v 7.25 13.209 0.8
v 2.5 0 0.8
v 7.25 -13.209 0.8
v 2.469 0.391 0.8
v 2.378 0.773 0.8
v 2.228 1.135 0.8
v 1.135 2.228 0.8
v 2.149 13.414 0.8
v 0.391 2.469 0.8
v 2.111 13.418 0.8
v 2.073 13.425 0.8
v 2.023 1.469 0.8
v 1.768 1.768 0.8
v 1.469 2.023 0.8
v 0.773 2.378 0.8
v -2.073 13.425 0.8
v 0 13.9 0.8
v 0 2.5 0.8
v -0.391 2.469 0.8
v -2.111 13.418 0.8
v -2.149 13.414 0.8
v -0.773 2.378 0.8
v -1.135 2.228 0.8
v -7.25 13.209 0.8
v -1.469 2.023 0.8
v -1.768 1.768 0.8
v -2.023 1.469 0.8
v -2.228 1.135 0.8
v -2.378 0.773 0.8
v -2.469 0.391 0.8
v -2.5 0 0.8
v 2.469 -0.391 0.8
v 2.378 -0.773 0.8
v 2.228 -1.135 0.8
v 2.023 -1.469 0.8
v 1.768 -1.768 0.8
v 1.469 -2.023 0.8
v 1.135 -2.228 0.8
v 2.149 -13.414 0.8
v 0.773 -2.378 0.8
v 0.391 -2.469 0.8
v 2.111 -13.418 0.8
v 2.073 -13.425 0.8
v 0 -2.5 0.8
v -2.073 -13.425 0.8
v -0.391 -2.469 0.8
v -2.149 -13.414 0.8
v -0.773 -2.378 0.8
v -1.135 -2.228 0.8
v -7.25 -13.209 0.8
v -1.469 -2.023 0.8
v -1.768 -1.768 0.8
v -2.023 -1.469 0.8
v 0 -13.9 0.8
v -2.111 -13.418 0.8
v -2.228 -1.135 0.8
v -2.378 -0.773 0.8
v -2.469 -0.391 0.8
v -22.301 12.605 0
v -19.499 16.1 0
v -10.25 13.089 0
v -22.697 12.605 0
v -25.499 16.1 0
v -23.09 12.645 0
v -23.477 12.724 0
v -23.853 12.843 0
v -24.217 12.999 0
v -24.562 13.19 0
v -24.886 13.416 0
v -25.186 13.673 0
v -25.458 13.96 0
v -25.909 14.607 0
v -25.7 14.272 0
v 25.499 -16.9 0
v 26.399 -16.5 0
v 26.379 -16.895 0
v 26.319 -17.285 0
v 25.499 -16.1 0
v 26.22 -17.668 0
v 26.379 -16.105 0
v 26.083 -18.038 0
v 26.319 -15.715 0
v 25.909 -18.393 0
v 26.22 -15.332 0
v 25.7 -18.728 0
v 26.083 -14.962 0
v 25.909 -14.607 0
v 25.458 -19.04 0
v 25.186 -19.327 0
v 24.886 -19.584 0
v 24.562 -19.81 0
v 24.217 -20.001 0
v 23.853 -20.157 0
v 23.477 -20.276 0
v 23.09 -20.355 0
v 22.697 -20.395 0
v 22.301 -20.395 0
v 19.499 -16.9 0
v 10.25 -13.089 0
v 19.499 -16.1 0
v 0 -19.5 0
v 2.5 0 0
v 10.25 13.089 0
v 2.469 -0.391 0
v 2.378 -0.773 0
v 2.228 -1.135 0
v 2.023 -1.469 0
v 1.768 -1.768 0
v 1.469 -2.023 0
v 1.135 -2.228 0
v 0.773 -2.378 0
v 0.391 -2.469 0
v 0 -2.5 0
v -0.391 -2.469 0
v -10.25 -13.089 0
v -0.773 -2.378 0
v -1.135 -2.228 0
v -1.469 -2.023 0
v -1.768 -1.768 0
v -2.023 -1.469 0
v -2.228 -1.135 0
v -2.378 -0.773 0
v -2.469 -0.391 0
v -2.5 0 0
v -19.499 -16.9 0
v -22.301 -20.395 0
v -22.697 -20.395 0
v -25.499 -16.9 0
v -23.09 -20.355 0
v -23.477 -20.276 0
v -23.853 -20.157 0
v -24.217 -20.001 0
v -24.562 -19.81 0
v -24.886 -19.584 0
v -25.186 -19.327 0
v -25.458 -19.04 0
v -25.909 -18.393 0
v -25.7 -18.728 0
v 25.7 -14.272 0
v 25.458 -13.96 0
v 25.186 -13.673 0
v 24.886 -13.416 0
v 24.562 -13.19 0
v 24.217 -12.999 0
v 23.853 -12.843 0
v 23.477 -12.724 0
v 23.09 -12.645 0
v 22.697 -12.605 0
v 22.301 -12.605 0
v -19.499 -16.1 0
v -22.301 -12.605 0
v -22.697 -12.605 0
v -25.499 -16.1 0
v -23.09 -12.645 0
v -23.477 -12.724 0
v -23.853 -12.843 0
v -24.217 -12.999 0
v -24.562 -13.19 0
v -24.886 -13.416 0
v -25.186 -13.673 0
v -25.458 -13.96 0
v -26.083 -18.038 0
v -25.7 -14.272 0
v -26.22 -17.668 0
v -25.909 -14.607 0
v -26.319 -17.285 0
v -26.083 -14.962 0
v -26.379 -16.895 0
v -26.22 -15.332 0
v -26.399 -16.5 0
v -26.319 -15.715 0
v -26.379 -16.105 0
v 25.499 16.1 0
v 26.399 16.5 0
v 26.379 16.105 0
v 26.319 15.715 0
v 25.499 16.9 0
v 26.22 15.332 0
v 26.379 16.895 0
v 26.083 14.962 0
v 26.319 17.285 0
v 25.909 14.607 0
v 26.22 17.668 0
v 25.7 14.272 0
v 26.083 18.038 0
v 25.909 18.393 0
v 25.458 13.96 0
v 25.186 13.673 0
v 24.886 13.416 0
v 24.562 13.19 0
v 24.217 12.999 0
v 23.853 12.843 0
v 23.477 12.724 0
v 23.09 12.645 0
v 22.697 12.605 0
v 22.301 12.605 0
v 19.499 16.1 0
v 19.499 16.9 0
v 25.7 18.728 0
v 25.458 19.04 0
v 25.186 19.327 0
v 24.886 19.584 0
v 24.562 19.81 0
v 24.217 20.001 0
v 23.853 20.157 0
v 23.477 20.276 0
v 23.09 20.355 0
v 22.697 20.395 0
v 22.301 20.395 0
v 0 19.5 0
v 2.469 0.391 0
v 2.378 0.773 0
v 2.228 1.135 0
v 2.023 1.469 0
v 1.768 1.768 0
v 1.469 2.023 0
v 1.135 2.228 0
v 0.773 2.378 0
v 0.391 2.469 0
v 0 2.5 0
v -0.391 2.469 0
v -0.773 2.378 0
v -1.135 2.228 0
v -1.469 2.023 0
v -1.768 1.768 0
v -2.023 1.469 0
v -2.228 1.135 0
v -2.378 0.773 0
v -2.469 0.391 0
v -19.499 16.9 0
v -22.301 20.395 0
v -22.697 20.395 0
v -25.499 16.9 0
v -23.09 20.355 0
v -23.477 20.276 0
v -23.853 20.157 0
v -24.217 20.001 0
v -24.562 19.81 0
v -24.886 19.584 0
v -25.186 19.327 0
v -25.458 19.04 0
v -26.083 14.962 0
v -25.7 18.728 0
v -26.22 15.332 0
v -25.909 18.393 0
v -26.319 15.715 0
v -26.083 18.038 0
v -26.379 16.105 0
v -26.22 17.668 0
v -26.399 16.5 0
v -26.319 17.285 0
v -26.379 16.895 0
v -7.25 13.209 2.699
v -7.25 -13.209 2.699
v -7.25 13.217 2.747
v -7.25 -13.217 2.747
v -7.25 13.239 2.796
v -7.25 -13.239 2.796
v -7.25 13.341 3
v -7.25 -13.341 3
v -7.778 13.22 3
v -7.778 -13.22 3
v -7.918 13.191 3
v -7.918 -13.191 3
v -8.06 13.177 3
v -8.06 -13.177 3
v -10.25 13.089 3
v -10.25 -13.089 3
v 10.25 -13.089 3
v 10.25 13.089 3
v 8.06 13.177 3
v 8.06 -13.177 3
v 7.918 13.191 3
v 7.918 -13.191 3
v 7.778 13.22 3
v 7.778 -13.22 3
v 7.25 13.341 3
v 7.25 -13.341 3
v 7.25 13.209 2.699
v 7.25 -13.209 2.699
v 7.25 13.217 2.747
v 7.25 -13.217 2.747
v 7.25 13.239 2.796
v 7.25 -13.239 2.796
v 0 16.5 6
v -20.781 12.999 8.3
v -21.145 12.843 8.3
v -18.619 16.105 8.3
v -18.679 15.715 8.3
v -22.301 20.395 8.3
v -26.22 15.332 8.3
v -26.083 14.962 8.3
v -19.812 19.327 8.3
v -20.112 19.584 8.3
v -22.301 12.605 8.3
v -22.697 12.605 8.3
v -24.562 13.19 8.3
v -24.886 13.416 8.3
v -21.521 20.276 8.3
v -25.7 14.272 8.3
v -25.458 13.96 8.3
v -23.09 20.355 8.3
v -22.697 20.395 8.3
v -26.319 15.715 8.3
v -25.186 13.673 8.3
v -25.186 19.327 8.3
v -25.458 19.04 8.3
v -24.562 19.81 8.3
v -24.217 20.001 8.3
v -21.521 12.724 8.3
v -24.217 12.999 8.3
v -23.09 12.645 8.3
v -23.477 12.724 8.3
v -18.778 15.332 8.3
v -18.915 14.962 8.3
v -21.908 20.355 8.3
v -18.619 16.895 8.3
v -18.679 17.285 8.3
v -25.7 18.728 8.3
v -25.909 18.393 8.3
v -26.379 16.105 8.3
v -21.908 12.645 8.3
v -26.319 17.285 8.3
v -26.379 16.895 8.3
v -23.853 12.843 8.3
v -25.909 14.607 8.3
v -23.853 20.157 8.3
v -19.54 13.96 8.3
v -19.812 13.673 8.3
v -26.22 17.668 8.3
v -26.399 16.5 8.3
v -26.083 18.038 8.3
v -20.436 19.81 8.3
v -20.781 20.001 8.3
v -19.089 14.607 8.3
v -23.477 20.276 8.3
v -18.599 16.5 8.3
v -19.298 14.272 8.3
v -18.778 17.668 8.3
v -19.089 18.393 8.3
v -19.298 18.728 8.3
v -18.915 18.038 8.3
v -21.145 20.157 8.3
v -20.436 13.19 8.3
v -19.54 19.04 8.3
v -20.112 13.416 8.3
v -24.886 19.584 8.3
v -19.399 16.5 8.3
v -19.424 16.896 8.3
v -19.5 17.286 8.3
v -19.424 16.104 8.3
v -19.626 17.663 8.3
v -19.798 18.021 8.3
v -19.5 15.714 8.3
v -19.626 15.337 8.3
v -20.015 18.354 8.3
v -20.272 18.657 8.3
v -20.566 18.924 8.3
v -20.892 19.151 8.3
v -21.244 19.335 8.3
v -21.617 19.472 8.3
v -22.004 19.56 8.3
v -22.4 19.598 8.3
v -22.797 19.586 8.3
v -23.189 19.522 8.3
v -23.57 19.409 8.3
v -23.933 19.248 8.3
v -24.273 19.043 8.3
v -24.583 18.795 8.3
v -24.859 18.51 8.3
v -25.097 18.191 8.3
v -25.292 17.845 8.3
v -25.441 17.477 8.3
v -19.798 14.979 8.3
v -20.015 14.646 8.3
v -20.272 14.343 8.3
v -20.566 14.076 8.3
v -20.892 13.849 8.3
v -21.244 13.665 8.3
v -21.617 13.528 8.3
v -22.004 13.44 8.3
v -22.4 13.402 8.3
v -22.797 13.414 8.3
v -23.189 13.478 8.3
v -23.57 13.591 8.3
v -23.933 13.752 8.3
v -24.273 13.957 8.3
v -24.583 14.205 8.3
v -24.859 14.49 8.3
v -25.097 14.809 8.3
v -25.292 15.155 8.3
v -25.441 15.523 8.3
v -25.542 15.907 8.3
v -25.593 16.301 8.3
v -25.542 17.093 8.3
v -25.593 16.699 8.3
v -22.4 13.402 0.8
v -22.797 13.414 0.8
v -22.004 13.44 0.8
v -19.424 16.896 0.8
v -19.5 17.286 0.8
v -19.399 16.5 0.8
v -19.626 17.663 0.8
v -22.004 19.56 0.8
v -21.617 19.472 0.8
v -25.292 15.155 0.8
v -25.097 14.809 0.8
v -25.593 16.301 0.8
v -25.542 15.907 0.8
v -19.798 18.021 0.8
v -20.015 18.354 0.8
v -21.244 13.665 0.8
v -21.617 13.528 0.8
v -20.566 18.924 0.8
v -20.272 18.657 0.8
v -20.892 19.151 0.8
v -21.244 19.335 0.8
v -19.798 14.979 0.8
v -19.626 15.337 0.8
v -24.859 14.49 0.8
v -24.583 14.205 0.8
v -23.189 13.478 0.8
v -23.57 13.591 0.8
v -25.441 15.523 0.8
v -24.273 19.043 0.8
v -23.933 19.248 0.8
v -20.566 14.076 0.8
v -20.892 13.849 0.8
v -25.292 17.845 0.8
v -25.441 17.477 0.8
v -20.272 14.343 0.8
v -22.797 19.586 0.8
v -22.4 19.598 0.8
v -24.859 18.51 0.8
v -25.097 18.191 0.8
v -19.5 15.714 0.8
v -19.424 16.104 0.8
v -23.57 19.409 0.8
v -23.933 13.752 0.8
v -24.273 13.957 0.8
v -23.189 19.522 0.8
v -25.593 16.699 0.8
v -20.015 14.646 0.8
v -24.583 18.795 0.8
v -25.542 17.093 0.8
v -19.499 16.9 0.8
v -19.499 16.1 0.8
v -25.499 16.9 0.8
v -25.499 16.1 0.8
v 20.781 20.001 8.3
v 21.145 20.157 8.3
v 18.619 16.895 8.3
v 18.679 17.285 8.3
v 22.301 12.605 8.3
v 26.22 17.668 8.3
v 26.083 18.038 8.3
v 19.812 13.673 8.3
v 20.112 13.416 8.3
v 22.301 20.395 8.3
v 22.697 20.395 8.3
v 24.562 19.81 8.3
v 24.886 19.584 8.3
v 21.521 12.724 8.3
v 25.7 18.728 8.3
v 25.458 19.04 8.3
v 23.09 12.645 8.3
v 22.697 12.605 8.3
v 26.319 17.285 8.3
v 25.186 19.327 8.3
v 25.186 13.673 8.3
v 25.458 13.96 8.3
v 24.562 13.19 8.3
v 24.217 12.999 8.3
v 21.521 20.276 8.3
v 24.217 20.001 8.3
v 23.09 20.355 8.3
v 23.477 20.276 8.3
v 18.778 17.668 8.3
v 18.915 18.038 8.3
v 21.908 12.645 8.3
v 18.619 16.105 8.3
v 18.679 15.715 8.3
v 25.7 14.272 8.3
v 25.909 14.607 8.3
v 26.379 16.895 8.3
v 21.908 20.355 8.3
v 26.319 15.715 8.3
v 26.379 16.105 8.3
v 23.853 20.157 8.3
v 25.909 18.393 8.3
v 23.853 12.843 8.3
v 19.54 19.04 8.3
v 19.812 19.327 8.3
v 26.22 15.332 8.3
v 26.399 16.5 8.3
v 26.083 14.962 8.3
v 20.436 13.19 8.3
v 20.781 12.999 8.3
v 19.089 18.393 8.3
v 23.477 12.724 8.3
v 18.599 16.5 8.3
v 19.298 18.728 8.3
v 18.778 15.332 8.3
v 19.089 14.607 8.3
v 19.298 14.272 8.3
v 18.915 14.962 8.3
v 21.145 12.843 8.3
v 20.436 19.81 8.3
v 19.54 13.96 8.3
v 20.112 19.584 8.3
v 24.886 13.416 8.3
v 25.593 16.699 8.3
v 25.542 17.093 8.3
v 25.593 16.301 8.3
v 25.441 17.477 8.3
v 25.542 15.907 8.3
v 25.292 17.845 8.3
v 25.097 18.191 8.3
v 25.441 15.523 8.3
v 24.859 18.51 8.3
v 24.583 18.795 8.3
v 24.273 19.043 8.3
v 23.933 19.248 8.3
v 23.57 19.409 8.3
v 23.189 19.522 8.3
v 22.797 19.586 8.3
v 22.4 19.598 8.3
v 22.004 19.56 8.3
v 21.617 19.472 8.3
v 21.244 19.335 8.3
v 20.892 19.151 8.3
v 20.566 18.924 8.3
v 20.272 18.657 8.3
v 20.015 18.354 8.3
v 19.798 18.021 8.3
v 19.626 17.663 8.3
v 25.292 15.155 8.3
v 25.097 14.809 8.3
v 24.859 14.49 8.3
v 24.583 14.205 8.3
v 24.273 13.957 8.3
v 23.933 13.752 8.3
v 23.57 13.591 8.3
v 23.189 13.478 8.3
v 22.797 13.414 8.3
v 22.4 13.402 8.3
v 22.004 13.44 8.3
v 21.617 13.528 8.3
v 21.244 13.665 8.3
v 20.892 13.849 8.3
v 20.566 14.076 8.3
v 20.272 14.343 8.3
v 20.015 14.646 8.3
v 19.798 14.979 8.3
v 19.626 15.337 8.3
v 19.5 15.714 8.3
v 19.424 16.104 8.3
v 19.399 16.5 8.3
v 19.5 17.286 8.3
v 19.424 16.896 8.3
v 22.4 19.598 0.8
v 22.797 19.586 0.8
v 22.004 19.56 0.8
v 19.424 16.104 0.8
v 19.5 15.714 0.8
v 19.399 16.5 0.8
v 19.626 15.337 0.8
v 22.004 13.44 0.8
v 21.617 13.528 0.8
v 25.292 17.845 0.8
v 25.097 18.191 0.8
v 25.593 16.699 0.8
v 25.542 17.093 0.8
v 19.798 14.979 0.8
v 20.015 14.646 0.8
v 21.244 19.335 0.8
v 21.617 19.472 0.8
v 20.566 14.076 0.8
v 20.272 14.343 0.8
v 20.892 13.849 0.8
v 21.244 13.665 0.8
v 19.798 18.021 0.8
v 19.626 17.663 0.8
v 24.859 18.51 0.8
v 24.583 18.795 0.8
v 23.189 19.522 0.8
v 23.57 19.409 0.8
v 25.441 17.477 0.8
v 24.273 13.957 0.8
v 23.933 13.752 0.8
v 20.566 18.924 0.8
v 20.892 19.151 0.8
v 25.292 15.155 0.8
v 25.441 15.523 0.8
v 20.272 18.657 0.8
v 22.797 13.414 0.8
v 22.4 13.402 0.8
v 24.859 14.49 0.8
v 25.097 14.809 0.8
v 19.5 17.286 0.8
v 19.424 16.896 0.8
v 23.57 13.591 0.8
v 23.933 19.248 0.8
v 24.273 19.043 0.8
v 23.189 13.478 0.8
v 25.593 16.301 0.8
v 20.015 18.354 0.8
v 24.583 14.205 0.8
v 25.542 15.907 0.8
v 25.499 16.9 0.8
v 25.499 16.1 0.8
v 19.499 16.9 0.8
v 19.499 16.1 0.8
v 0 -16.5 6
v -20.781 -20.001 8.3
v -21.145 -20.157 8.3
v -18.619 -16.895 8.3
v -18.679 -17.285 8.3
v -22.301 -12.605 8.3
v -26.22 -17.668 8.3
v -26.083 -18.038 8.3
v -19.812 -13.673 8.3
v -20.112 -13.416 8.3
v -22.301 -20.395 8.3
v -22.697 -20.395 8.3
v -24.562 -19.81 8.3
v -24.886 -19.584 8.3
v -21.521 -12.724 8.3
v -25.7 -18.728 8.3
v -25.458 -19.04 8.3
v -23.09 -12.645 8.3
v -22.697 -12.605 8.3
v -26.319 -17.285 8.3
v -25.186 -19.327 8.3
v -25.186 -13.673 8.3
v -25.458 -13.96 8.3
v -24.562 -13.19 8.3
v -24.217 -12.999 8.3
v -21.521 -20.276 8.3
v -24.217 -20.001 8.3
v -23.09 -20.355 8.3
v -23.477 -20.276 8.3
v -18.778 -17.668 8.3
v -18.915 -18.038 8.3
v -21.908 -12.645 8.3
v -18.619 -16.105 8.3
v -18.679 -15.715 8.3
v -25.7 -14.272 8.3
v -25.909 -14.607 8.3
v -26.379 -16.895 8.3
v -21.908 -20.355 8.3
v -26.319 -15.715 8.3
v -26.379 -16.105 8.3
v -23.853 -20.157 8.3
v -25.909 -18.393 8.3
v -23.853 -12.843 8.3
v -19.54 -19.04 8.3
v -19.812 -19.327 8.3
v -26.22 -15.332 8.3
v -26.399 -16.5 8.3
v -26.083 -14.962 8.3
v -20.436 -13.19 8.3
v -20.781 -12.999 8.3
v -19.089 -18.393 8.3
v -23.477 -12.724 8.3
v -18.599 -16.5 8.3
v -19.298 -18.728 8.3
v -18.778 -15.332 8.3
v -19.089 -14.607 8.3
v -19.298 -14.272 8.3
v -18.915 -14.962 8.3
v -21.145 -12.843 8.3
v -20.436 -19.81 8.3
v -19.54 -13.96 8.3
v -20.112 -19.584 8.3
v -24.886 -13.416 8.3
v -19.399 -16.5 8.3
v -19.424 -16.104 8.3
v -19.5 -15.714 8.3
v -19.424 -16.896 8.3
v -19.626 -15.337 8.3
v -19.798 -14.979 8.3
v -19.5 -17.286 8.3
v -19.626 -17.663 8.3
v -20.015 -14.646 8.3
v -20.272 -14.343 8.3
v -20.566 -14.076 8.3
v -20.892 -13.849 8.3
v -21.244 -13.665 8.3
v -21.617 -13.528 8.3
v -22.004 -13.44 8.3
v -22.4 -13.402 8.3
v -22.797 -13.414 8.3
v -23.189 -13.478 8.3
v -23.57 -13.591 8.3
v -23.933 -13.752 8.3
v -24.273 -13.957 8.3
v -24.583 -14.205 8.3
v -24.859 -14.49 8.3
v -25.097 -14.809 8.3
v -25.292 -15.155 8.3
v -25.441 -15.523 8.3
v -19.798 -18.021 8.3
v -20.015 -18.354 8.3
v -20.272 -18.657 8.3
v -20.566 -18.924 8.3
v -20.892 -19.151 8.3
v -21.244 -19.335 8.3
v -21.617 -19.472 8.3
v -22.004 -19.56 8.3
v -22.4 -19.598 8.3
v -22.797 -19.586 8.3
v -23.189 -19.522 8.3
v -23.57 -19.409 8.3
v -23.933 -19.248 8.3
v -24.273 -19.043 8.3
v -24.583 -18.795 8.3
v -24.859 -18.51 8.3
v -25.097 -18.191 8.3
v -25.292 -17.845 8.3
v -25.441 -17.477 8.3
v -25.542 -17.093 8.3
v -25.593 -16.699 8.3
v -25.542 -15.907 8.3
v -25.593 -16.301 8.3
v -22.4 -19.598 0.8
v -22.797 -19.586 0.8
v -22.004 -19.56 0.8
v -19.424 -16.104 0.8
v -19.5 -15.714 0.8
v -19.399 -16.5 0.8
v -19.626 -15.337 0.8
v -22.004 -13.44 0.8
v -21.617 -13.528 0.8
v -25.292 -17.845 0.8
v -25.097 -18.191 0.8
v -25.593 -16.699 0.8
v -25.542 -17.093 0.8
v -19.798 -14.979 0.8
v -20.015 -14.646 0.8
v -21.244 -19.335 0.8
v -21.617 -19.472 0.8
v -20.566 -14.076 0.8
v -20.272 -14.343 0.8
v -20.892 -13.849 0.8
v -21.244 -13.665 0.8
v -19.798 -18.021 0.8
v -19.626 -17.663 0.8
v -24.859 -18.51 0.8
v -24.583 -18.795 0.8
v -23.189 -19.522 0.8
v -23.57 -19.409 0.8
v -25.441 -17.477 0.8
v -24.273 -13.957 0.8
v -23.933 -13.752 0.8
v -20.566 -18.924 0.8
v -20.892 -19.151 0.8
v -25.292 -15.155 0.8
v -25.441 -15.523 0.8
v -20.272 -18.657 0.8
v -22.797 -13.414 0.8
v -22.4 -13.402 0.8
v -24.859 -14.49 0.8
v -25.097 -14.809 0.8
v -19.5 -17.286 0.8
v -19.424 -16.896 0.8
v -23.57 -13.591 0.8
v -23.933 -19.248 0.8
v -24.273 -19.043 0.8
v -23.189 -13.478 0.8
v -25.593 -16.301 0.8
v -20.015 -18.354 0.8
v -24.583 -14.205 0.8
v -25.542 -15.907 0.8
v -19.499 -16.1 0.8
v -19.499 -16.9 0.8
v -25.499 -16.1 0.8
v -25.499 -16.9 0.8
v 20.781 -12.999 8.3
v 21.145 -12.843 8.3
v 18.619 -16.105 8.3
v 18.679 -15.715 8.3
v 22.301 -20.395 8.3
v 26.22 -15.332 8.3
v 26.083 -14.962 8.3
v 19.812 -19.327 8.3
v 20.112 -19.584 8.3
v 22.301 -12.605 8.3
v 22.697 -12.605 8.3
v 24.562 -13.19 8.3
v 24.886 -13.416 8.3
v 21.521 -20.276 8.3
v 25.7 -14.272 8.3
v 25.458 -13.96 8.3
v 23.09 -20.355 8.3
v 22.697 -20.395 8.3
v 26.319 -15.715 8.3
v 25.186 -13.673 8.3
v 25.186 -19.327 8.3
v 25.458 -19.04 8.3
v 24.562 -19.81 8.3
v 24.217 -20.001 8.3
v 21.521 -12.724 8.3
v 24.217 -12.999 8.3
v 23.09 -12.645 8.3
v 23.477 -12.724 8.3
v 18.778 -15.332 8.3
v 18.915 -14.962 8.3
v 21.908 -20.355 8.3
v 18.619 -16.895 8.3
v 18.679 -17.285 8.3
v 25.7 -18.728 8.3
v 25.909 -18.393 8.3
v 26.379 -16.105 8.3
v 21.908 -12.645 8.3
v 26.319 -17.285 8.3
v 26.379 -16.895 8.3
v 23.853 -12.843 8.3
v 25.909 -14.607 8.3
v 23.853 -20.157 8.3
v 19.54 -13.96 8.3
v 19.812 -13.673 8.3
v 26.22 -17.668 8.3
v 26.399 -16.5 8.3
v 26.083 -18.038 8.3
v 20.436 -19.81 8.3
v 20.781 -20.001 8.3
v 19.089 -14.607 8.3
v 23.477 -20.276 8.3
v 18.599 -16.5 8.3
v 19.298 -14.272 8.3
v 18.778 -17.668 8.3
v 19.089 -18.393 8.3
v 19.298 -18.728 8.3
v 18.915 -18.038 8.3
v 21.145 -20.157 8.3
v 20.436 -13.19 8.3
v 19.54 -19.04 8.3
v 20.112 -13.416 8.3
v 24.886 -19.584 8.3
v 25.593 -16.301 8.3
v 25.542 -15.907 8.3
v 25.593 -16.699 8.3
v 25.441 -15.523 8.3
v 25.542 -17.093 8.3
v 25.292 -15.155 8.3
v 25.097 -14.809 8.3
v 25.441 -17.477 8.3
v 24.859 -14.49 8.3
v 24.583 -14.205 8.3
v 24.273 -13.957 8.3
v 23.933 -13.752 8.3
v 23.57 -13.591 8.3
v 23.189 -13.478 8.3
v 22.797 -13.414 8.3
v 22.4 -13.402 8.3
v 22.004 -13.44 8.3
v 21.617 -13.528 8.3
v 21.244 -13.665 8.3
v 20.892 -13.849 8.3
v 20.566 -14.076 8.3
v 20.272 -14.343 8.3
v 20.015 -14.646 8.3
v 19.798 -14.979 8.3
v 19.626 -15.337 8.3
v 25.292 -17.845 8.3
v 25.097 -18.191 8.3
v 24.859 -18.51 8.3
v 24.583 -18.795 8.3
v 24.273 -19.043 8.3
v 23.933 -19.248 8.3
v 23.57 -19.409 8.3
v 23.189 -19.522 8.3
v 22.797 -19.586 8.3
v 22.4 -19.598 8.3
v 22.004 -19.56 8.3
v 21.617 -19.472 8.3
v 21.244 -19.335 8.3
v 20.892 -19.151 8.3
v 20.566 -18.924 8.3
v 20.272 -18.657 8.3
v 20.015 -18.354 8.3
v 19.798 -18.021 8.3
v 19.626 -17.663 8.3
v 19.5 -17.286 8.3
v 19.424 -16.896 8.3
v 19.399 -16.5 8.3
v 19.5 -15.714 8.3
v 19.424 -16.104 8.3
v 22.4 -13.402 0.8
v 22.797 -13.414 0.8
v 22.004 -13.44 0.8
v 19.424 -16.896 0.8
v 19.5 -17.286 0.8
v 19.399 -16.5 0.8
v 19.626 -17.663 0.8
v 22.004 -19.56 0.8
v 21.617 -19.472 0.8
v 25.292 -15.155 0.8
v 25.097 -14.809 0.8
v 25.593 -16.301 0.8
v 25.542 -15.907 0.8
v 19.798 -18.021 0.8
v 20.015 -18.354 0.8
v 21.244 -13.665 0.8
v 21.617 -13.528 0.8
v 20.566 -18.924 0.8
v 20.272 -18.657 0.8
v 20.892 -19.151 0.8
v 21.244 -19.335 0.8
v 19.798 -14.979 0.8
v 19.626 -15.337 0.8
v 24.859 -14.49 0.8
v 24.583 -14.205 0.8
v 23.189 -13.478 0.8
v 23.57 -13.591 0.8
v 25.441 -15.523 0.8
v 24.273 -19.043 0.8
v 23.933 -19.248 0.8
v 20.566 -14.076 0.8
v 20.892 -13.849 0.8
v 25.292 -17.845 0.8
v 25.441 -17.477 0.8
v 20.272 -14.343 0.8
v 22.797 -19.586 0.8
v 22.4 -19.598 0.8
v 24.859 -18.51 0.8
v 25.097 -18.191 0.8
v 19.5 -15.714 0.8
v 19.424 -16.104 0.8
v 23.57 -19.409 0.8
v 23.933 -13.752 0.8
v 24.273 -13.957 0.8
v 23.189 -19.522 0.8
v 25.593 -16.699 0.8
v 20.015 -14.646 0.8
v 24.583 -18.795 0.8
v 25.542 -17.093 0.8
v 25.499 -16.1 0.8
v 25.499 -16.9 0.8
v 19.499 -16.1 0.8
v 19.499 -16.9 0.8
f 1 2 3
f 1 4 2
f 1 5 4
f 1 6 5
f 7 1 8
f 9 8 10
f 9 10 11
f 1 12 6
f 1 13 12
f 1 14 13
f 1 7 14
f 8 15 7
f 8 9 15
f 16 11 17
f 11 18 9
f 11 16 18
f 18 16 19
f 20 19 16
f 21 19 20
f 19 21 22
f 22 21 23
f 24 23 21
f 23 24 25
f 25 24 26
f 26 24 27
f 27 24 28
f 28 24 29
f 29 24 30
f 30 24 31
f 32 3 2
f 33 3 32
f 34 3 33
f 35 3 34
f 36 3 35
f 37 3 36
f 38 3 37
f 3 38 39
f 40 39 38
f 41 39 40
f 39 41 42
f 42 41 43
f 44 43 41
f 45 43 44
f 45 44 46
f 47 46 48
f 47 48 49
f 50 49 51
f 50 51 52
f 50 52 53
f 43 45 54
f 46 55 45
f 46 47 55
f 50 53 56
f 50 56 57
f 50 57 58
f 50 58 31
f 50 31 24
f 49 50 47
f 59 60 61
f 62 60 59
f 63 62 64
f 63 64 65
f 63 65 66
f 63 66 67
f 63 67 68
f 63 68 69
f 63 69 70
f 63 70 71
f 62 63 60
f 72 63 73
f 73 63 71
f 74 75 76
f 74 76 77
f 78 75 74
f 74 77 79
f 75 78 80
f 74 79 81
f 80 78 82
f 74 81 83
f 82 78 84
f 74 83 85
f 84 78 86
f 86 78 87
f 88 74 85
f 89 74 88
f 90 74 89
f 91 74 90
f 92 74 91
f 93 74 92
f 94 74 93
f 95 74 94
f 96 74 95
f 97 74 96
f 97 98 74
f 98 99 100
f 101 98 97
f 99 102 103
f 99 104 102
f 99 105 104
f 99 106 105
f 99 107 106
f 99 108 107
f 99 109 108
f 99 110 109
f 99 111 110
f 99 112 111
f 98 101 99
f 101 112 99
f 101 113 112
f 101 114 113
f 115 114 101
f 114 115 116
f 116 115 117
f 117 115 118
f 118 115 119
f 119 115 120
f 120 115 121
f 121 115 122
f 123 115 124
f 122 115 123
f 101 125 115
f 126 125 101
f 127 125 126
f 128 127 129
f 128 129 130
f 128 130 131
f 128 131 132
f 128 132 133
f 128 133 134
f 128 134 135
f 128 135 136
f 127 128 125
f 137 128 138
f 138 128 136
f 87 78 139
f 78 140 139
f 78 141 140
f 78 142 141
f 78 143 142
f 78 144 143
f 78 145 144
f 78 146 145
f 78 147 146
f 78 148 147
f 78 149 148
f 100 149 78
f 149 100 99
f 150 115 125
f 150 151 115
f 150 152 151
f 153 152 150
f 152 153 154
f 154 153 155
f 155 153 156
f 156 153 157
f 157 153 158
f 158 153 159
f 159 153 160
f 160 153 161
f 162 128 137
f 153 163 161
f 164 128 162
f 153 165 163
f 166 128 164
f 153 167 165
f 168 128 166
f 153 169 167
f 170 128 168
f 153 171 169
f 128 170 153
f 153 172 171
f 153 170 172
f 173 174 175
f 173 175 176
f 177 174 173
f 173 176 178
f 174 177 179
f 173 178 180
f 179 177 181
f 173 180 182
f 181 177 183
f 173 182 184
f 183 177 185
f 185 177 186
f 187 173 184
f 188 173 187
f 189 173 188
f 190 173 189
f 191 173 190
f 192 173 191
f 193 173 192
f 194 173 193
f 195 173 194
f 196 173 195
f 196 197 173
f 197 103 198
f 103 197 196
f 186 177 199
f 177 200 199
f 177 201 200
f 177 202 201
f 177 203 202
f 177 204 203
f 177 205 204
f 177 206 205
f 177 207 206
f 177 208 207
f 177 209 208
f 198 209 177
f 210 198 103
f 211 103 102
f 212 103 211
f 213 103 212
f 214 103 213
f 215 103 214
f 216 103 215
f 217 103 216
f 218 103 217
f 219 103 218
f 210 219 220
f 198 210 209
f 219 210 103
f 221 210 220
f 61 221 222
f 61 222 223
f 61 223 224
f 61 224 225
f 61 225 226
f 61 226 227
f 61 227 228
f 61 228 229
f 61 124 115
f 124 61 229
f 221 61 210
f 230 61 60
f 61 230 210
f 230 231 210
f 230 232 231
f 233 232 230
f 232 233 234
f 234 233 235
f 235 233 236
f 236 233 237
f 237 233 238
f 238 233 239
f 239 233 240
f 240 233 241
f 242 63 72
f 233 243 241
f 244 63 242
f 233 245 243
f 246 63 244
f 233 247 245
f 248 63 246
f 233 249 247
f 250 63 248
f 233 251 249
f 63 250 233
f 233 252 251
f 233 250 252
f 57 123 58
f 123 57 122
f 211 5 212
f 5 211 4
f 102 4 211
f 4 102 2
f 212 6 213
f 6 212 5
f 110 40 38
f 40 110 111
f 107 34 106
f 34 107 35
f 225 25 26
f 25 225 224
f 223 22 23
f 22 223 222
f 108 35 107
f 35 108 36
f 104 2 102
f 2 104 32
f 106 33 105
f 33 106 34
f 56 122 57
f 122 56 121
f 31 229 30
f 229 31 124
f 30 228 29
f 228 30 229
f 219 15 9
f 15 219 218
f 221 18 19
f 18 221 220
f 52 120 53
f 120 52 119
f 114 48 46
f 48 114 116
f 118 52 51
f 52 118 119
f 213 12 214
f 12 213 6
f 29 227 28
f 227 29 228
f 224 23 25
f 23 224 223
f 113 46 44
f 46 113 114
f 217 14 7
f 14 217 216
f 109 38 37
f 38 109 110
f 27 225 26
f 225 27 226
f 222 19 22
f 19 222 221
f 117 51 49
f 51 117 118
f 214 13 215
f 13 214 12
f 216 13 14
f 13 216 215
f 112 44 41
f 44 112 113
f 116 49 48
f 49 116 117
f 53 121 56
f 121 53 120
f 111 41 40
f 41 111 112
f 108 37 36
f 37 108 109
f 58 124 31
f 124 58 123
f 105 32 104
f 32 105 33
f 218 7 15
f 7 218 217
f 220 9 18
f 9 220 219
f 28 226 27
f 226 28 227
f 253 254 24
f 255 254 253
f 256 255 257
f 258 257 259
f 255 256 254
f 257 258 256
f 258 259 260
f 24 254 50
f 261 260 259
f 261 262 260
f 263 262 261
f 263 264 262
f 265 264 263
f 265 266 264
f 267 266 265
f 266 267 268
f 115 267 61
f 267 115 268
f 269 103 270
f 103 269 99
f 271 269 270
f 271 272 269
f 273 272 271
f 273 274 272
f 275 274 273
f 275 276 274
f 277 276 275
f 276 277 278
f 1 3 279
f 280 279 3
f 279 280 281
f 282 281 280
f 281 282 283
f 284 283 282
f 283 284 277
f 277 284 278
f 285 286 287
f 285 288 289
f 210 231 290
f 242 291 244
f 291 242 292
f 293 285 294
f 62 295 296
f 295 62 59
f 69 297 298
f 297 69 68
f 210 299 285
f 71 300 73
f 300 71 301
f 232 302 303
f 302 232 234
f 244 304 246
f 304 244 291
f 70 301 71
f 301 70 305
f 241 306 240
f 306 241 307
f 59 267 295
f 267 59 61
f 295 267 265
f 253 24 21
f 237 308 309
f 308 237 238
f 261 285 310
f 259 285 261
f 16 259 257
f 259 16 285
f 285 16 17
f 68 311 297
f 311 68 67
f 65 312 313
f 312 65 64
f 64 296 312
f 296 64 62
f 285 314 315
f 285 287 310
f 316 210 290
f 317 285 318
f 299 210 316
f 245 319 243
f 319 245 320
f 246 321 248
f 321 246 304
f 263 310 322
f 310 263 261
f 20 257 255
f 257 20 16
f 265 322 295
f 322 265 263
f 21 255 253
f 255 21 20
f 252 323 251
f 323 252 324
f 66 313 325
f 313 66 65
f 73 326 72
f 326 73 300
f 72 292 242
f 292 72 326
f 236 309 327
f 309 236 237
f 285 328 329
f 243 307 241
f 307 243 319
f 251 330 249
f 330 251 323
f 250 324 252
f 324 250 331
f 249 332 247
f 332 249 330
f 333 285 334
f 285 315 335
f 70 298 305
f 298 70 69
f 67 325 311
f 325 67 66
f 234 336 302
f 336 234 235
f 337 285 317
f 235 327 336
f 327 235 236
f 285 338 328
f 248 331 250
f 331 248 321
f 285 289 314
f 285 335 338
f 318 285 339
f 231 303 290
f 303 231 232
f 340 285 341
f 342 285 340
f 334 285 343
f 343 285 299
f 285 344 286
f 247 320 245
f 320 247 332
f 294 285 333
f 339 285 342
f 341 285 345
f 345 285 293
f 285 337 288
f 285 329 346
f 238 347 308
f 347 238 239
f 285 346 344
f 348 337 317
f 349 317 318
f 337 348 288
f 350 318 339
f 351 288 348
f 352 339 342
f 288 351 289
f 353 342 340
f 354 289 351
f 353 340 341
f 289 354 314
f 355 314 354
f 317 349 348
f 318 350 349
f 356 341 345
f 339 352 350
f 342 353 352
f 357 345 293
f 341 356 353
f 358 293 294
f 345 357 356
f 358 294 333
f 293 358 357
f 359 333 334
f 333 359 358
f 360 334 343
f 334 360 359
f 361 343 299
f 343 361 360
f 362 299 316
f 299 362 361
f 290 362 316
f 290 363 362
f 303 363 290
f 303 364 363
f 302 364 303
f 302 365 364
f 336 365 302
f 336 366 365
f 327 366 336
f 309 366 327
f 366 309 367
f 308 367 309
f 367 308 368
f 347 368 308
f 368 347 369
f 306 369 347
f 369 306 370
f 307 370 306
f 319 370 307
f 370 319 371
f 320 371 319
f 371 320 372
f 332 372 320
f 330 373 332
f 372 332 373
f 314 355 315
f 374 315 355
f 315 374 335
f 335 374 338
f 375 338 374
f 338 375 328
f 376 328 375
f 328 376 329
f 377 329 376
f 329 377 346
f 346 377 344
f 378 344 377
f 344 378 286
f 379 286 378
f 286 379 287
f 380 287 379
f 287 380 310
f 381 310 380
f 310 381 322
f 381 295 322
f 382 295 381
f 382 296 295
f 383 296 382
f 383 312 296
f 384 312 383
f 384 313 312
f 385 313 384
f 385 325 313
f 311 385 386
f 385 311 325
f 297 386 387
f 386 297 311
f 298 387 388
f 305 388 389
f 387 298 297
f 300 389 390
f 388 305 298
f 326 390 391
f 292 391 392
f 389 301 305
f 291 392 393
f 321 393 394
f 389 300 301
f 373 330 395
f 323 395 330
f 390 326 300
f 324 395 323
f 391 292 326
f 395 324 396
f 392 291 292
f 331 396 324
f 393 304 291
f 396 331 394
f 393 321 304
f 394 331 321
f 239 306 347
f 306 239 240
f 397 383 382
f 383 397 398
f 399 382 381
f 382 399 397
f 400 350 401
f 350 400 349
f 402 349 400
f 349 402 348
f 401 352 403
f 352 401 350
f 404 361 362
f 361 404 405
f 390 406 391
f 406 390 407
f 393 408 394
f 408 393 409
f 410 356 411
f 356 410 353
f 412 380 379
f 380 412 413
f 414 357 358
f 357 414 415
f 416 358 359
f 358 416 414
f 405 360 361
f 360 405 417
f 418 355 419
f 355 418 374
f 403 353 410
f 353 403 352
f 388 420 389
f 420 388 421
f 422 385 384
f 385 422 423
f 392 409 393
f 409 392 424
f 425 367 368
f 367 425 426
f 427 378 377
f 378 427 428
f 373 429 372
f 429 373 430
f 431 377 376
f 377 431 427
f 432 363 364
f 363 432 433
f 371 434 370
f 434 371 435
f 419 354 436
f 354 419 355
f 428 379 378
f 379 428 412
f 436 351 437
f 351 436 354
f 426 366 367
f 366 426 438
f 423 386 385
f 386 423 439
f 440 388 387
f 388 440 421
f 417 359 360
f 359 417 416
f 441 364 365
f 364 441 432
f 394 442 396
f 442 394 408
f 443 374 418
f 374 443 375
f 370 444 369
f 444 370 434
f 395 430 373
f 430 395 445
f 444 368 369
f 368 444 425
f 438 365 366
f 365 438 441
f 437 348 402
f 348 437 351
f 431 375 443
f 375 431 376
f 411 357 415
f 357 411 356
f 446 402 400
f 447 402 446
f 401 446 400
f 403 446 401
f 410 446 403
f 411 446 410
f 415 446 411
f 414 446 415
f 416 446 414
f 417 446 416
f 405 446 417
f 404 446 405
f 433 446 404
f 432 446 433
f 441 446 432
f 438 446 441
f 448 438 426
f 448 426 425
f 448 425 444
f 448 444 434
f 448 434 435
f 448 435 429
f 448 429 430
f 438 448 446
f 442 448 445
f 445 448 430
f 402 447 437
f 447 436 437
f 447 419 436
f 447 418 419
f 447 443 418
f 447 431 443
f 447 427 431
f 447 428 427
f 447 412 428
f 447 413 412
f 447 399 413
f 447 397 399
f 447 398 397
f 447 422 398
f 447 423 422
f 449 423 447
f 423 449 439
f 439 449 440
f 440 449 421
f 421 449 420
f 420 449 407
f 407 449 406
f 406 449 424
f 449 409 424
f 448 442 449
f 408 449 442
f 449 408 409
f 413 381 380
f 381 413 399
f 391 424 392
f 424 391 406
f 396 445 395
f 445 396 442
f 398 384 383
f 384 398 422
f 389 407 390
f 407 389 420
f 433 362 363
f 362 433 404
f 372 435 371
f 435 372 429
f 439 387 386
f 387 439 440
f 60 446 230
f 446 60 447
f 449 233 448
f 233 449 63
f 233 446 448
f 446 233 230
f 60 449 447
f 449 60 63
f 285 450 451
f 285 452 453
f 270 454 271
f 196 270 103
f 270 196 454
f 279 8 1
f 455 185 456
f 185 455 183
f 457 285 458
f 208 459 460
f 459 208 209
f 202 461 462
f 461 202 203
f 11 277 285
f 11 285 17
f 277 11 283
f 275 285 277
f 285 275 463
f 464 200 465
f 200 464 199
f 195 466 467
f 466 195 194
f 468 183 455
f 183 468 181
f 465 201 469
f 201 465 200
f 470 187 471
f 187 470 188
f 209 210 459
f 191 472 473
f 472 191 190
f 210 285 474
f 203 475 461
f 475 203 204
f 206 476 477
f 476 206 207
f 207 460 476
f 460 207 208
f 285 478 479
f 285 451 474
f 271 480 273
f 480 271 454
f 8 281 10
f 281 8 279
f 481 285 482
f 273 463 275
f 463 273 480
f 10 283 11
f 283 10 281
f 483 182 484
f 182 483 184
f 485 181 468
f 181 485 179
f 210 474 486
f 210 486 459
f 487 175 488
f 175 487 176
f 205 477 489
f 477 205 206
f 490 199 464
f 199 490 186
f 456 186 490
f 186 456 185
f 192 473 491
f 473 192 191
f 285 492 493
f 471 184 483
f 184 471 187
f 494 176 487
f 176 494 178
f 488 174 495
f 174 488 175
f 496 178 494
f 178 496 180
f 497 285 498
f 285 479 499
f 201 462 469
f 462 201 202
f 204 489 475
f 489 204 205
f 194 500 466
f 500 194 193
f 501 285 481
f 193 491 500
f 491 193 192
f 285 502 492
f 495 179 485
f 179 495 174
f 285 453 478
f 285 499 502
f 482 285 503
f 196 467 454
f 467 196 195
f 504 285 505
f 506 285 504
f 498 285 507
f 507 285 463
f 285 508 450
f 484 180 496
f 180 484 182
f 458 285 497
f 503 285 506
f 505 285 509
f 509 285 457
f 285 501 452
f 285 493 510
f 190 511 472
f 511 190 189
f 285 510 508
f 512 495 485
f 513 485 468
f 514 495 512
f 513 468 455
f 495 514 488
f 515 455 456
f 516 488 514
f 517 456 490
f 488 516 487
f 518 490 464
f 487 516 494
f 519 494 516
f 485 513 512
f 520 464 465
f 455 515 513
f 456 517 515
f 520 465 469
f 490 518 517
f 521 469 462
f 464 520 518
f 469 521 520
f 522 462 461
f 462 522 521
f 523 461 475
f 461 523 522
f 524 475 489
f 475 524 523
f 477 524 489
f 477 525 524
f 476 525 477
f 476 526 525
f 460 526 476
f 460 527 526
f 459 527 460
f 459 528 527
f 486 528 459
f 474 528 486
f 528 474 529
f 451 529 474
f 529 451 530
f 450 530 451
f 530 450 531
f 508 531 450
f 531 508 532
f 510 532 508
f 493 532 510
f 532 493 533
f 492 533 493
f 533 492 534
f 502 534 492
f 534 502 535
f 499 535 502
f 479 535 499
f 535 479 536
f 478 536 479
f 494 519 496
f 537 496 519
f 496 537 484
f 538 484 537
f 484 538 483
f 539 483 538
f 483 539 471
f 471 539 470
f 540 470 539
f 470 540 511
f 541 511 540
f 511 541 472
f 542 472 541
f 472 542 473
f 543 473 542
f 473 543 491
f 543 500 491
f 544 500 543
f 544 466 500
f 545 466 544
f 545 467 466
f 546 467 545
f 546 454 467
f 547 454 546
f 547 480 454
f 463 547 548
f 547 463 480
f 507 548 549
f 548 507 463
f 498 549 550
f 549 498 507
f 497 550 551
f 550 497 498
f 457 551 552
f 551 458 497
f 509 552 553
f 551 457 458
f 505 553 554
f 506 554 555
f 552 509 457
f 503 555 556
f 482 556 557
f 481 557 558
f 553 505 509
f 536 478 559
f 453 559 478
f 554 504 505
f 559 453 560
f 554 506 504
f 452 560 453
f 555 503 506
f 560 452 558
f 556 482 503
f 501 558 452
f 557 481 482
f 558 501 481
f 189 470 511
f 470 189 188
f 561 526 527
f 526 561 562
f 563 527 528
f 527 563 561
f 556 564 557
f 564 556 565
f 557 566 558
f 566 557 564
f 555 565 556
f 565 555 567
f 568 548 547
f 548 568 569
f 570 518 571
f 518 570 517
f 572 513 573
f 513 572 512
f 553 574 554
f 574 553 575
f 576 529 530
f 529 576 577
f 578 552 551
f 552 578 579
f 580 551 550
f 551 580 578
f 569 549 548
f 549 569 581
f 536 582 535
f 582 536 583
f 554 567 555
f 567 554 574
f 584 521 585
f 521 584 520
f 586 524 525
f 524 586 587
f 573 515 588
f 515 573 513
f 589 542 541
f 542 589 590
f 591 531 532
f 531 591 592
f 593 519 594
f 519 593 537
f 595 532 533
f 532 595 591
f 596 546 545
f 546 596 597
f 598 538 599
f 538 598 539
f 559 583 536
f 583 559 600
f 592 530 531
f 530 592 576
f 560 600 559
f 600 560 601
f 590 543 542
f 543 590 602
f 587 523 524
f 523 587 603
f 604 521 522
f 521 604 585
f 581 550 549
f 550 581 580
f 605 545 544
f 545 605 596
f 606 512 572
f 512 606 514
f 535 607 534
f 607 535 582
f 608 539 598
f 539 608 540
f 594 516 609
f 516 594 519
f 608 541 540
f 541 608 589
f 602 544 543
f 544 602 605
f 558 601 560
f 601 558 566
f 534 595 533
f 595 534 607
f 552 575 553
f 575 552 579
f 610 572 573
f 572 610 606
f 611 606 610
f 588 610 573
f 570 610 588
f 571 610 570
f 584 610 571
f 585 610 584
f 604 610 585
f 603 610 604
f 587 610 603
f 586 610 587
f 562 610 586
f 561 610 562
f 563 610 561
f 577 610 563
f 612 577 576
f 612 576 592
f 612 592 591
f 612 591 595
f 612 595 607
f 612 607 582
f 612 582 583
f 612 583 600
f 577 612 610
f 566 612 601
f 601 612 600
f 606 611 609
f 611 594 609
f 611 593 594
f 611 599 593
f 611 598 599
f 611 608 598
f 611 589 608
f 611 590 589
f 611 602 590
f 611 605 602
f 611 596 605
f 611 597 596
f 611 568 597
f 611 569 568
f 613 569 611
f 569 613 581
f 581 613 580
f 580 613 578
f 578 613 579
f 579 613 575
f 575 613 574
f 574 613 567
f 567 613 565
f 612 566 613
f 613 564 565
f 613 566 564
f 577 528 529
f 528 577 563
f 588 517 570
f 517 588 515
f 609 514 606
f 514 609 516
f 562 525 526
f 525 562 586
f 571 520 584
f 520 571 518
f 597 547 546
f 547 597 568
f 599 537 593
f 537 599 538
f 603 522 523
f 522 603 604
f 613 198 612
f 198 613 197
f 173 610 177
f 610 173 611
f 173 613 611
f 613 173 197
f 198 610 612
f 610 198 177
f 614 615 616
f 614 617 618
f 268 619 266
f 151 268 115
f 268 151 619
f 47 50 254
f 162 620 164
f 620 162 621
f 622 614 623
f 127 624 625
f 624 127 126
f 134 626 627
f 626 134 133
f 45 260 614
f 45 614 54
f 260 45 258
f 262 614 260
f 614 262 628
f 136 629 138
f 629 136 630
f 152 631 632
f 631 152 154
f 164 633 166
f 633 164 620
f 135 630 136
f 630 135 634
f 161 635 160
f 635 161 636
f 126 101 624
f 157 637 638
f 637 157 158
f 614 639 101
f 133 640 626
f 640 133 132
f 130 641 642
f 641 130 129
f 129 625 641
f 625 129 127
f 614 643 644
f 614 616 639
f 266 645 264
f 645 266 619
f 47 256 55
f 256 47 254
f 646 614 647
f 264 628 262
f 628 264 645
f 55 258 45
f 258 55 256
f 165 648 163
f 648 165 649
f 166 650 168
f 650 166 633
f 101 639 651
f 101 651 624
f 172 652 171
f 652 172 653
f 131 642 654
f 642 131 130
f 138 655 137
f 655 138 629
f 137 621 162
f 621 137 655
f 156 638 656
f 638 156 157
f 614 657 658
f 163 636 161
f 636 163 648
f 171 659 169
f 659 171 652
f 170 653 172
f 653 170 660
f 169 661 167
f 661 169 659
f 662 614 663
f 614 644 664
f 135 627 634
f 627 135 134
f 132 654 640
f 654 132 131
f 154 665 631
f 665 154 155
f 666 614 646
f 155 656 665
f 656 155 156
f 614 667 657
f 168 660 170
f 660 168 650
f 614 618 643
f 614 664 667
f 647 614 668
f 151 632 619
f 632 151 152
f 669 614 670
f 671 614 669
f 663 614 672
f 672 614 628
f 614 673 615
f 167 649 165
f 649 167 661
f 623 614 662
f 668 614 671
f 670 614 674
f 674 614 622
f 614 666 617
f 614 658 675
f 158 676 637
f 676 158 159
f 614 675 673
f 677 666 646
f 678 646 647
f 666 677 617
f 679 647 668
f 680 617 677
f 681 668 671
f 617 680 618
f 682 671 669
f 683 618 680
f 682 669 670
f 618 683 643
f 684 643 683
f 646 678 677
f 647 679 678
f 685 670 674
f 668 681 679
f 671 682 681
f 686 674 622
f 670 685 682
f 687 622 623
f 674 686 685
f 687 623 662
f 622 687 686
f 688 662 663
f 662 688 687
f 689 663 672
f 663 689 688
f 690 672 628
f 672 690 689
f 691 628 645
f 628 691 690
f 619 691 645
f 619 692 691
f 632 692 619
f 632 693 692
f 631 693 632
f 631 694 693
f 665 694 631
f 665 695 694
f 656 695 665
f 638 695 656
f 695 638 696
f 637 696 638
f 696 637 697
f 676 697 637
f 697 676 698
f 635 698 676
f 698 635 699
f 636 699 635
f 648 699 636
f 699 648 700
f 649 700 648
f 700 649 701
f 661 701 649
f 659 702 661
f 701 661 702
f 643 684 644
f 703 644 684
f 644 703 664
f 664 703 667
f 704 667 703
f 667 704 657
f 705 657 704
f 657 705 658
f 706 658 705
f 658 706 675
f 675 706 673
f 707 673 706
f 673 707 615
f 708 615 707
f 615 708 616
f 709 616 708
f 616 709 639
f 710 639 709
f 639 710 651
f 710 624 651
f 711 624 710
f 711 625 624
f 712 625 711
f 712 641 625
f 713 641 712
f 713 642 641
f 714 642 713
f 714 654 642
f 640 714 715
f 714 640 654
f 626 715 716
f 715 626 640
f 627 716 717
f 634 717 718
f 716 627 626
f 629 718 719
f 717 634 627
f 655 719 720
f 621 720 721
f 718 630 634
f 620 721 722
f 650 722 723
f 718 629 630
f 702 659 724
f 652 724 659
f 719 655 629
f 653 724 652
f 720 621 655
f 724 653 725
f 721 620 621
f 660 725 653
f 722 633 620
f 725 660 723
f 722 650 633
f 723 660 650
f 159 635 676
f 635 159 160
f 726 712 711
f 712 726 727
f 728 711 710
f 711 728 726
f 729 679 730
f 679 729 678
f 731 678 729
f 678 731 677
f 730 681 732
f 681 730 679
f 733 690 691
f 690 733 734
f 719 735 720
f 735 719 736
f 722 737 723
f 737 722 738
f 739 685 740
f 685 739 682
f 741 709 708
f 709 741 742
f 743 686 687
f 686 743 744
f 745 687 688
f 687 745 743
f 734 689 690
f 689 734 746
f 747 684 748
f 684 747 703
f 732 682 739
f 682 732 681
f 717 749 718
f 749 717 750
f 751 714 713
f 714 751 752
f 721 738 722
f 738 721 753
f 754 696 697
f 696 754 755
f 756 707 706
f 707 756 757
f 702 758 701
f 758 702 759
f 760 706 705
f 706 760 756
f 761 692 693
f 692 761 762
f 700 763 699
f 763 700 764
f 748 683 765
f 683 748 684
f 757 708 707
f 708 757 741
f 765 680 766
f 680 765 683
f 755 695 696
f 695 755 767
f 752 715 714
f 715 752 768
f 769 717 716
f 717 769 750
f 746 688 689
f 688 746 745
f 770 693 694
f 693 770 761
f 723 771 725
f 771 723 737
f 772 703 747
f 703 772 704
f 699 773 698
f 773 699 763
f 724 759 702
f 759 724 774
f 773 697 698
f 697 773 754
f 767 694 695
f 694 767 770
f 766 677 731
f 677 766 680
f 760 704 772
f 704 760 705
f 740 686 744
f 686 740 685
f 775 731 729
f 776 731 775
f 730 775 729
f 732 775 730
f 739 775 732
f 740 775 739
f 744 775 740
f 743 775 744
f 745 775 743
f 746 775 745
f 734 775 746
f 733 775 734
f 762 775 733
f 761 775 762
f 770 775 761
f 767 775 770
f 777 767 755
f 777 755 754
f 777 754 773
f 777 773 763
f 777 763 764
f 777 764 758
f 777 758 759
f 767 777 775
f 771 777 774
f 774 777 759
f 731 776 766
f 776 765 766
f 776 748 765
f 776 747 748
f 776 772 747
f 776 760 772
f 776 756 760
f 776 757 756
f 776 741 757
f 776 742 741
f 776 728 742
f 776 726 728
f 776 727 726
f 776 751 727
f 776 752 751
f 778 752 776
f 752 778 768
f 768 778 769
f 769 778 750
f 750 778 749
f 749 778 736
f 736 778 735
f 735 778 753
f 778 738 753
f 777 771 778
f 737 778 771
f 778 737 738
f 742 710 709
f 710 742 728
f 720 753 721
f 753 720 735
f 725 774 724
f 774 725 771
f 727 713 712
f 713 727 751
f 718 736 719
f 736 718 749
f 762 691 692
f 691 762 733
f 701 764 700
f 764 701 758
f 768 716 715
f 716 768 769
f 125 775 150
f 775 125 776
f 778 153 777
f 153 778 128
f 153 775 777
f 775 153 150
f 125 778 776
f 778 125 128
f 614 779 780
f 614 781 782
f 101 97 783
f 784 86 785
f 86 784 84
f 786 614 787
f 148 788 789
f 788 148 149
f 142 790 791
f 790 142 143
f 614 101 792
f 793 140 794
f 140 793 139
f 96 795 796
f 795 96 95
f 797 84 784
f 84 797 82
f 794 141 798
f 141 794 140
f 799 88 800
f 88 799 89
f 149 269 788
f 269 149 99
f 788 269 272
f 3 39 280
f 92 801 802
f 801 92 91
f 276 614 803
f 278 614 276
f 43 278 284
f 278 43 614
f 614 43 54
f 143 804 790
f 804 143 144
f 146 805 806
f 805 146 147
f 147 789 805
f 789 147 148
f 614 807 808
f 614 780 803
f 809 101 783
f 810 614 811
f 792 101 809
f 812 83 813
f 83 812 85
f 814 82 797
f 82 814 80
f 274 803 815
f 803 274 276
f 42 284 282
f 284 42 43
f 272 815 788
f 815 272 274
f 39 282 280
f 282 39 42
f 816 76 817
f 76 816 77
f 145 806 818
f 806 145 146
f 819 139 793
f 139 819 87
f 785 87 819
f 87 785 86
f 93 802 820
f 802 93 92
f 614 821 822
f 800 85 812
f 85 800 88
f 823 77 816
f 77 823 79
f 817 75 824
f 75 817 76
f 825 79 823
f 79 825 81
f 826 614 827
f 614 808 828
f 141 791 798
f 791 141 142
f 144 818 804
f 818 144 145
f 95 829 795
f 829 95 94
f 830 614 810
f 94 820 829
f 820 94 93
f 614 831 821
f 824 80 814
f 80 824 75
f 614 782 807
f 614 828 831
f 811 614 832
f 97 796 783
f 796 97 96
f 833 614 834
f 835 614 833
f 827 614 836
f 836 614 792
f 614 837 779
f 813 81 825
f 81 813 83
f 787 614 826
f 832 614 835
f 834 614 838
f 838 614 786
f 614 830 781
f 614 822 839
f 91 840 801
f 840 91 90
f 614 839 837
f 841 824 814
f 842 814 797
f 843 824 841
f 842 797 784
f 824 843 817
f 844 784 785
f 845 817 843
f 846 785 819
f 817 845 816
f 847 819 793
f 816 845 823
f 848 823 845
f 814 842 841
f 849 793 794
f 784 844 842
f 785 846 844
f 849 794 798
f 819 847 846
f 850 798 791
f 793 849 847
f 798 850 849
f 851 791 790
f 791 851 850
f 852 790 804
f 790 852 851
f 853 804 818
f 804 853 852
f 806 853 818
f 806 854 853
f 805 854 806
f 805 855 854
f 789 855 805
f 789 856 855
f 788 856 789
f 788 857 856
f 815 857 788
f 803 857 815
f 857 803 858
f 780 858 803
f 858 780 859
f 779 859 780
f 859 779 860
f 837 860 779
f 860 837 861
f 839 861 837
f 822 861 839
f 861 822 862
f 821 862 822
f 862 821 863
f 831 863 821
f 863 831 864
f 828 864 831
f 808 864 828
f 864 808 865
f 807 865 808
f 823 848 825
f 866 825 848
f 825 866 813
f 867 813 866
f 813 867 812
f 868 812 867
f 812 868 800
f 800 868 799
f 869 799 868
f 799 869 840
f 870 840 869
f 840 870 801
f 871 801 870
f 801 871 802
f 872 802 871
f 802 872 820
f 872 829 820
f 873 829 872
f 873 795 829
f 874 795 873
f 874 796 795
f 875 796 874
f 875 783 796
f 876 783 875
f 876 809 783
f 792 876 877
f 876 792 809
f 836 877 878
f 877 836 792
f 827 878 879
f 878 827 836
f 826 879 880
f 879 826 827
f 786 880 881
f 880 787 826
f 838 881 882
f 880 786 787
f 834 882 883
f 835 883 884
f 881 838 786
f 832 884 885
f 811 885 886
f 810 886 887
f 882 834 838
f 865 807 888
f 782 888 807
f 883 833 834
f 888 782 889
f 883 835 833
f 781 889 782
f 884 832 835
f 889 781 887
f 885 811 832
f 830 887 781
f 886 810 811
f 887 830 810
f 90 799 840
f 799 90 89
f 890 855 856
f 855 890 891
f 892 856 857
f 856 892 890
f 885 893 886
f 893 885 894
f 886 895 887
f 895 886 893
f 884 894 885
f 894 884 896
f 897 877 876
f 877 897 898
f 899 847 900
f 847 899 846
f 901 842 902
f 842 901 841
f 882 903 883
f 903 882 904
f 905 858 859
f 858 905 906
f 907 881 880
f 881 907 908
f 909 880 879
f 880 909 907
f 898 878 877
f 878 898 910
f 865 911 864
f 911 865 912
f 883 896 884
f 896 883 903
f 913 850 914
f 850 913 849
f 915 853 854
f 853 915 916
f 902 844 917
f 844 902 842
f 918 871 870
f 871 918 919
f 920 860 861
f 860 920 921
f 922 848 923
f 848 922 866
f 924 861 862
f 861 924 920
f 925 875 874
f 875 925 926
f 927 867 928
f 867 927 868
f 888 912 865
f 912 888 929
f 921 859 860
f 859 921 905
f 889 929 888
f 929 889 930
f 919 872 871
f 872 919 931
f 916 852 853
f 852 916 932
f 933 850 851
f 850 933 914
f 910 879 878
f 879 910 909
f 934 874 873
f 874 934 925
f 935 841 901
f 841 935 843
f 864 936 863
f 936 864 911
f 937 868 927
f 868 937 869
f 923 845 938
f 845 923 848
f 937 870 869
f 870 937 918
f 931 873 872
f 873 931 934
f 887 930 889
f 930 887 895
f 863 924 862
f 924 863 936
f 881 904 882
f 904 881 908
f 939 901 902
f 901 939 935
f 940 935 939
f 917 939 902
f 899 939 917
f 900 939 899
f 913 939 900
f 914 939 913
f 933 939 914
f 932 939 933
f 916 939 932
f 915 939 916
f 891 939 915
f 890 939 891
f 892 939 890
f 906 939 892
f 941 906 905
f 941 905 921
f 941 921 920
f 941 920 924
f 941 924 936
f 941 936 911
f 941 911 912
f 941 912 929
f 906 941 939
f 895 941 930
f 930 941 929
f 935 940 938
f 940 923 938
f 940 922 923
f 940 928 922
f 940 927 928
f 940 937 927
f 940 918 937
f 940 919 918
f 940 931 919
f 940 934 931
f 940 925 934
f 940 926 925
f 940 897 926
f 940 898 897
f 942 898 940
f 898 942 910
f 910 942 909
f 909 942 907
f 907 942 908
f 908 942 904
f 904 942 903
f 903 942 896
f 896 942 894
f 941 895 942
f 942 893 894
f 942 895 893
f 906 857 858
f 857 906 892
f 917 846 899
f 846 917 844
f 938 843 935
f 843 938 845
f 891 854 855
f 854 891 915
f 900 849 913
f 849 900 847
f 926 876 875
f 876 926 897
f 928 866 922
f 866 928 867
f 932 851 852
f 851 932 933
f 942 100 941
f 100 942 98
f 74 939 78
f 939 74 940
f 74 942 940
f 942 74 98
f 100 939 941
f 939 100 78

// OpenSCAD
$fa = 1;
$fs = 0.4;

//------- CONSTANTS ----------
MOTOR_DIAMETER = 6;
MOTOR_HEIGHT = 15;
PROPELLER_DIAMETER = 30;
AVR_LENGTH = 35;

//------- VARIABLES ----------
TICKNESS_MIN = 0.8;
TICKNESS_MAX = 3;
CLEA = 0.1; // Clearence

ARM_LENGTH = PROPELLER_DIAMETER * 0.75;//PROPELLER_DIAMETER/2;
BASE_DIMS = [AVR_LENGTH/2, PROPELLER_DIAMETER * 1.1, TICKNESS_MIN];


/* ------- Test -------------- */
base();
translate([-ARM_LENGTH +0.001, BASE_DIMS[1]/2, 0])
complete_arm();
translate([ARM_LENGTH - 0.001, BASE_DIMS[1]/2, 0])
rotate([0,0,180])
complete_arm();
translate([-ARM_LENGTH +0.001, -BASE_DIMS[1]/2, 0])
complete_arm();
translate([ARM_LENGTH - 0.001, -BASE_DIMS[1]/2, 0])
rotate([0,0,180])
complete_arm();

/*------- Main Modules -------- */
module complete_arm()
{
    difference()
    {
        hull()
        {
            cylinder(r = MOTOR_DIAMETER/2 + TICKNESS_MIN + CLEA, h = MOTOR_HEIGHT/2 + TICKNESS_MIN);
            arm();
        }
        
        translate([0, 0, TICKNESS_MIN])
        cylinder(r = MOTOR_DIAMETER/2 + CLEA, h = MOTOR_HEIGHT);
        cube([MOTOR_DIAMETER, TICKNESS_MIN, 3*TICKNESS_MIN], center=true);
    }
}

module base()
{
    difference()
    {
    translate([0, 0, BASE_DIMS[2]/2])
    cube(BASE_DIMS, center = true);
    cylinder(r= 2.5, h =10, center=true);
    }
    
    /* Add Strenght */
    translate([-BASE_DIMS[0]/2, 0, TICKNESS_MAX/2])
    cube([TICKNESS_MAX, BASE_DIMS[1], TICKNESS_MAX], center = true);
    translate([BASE_DIMS[0]/2, 0, TICKNESS_MAX/2])
    cube([TICKNESS_MAX, BASE_DIMS[1], TICKNESS_MAX], center = true);
}

/*------- Helper Modules -------- */
module arm()
{
    translate([0, -MOTOR_DIAMETER/2,0])
    rotate([90,0,90])
    linear_extrude(ARM_LENGTH)
    {
        polygon([[0,0],[MOTOR_DIAMETER/2,MOTOR_DIAMETER],[MOTOR_DIAMETER,0]]);
    }
}
